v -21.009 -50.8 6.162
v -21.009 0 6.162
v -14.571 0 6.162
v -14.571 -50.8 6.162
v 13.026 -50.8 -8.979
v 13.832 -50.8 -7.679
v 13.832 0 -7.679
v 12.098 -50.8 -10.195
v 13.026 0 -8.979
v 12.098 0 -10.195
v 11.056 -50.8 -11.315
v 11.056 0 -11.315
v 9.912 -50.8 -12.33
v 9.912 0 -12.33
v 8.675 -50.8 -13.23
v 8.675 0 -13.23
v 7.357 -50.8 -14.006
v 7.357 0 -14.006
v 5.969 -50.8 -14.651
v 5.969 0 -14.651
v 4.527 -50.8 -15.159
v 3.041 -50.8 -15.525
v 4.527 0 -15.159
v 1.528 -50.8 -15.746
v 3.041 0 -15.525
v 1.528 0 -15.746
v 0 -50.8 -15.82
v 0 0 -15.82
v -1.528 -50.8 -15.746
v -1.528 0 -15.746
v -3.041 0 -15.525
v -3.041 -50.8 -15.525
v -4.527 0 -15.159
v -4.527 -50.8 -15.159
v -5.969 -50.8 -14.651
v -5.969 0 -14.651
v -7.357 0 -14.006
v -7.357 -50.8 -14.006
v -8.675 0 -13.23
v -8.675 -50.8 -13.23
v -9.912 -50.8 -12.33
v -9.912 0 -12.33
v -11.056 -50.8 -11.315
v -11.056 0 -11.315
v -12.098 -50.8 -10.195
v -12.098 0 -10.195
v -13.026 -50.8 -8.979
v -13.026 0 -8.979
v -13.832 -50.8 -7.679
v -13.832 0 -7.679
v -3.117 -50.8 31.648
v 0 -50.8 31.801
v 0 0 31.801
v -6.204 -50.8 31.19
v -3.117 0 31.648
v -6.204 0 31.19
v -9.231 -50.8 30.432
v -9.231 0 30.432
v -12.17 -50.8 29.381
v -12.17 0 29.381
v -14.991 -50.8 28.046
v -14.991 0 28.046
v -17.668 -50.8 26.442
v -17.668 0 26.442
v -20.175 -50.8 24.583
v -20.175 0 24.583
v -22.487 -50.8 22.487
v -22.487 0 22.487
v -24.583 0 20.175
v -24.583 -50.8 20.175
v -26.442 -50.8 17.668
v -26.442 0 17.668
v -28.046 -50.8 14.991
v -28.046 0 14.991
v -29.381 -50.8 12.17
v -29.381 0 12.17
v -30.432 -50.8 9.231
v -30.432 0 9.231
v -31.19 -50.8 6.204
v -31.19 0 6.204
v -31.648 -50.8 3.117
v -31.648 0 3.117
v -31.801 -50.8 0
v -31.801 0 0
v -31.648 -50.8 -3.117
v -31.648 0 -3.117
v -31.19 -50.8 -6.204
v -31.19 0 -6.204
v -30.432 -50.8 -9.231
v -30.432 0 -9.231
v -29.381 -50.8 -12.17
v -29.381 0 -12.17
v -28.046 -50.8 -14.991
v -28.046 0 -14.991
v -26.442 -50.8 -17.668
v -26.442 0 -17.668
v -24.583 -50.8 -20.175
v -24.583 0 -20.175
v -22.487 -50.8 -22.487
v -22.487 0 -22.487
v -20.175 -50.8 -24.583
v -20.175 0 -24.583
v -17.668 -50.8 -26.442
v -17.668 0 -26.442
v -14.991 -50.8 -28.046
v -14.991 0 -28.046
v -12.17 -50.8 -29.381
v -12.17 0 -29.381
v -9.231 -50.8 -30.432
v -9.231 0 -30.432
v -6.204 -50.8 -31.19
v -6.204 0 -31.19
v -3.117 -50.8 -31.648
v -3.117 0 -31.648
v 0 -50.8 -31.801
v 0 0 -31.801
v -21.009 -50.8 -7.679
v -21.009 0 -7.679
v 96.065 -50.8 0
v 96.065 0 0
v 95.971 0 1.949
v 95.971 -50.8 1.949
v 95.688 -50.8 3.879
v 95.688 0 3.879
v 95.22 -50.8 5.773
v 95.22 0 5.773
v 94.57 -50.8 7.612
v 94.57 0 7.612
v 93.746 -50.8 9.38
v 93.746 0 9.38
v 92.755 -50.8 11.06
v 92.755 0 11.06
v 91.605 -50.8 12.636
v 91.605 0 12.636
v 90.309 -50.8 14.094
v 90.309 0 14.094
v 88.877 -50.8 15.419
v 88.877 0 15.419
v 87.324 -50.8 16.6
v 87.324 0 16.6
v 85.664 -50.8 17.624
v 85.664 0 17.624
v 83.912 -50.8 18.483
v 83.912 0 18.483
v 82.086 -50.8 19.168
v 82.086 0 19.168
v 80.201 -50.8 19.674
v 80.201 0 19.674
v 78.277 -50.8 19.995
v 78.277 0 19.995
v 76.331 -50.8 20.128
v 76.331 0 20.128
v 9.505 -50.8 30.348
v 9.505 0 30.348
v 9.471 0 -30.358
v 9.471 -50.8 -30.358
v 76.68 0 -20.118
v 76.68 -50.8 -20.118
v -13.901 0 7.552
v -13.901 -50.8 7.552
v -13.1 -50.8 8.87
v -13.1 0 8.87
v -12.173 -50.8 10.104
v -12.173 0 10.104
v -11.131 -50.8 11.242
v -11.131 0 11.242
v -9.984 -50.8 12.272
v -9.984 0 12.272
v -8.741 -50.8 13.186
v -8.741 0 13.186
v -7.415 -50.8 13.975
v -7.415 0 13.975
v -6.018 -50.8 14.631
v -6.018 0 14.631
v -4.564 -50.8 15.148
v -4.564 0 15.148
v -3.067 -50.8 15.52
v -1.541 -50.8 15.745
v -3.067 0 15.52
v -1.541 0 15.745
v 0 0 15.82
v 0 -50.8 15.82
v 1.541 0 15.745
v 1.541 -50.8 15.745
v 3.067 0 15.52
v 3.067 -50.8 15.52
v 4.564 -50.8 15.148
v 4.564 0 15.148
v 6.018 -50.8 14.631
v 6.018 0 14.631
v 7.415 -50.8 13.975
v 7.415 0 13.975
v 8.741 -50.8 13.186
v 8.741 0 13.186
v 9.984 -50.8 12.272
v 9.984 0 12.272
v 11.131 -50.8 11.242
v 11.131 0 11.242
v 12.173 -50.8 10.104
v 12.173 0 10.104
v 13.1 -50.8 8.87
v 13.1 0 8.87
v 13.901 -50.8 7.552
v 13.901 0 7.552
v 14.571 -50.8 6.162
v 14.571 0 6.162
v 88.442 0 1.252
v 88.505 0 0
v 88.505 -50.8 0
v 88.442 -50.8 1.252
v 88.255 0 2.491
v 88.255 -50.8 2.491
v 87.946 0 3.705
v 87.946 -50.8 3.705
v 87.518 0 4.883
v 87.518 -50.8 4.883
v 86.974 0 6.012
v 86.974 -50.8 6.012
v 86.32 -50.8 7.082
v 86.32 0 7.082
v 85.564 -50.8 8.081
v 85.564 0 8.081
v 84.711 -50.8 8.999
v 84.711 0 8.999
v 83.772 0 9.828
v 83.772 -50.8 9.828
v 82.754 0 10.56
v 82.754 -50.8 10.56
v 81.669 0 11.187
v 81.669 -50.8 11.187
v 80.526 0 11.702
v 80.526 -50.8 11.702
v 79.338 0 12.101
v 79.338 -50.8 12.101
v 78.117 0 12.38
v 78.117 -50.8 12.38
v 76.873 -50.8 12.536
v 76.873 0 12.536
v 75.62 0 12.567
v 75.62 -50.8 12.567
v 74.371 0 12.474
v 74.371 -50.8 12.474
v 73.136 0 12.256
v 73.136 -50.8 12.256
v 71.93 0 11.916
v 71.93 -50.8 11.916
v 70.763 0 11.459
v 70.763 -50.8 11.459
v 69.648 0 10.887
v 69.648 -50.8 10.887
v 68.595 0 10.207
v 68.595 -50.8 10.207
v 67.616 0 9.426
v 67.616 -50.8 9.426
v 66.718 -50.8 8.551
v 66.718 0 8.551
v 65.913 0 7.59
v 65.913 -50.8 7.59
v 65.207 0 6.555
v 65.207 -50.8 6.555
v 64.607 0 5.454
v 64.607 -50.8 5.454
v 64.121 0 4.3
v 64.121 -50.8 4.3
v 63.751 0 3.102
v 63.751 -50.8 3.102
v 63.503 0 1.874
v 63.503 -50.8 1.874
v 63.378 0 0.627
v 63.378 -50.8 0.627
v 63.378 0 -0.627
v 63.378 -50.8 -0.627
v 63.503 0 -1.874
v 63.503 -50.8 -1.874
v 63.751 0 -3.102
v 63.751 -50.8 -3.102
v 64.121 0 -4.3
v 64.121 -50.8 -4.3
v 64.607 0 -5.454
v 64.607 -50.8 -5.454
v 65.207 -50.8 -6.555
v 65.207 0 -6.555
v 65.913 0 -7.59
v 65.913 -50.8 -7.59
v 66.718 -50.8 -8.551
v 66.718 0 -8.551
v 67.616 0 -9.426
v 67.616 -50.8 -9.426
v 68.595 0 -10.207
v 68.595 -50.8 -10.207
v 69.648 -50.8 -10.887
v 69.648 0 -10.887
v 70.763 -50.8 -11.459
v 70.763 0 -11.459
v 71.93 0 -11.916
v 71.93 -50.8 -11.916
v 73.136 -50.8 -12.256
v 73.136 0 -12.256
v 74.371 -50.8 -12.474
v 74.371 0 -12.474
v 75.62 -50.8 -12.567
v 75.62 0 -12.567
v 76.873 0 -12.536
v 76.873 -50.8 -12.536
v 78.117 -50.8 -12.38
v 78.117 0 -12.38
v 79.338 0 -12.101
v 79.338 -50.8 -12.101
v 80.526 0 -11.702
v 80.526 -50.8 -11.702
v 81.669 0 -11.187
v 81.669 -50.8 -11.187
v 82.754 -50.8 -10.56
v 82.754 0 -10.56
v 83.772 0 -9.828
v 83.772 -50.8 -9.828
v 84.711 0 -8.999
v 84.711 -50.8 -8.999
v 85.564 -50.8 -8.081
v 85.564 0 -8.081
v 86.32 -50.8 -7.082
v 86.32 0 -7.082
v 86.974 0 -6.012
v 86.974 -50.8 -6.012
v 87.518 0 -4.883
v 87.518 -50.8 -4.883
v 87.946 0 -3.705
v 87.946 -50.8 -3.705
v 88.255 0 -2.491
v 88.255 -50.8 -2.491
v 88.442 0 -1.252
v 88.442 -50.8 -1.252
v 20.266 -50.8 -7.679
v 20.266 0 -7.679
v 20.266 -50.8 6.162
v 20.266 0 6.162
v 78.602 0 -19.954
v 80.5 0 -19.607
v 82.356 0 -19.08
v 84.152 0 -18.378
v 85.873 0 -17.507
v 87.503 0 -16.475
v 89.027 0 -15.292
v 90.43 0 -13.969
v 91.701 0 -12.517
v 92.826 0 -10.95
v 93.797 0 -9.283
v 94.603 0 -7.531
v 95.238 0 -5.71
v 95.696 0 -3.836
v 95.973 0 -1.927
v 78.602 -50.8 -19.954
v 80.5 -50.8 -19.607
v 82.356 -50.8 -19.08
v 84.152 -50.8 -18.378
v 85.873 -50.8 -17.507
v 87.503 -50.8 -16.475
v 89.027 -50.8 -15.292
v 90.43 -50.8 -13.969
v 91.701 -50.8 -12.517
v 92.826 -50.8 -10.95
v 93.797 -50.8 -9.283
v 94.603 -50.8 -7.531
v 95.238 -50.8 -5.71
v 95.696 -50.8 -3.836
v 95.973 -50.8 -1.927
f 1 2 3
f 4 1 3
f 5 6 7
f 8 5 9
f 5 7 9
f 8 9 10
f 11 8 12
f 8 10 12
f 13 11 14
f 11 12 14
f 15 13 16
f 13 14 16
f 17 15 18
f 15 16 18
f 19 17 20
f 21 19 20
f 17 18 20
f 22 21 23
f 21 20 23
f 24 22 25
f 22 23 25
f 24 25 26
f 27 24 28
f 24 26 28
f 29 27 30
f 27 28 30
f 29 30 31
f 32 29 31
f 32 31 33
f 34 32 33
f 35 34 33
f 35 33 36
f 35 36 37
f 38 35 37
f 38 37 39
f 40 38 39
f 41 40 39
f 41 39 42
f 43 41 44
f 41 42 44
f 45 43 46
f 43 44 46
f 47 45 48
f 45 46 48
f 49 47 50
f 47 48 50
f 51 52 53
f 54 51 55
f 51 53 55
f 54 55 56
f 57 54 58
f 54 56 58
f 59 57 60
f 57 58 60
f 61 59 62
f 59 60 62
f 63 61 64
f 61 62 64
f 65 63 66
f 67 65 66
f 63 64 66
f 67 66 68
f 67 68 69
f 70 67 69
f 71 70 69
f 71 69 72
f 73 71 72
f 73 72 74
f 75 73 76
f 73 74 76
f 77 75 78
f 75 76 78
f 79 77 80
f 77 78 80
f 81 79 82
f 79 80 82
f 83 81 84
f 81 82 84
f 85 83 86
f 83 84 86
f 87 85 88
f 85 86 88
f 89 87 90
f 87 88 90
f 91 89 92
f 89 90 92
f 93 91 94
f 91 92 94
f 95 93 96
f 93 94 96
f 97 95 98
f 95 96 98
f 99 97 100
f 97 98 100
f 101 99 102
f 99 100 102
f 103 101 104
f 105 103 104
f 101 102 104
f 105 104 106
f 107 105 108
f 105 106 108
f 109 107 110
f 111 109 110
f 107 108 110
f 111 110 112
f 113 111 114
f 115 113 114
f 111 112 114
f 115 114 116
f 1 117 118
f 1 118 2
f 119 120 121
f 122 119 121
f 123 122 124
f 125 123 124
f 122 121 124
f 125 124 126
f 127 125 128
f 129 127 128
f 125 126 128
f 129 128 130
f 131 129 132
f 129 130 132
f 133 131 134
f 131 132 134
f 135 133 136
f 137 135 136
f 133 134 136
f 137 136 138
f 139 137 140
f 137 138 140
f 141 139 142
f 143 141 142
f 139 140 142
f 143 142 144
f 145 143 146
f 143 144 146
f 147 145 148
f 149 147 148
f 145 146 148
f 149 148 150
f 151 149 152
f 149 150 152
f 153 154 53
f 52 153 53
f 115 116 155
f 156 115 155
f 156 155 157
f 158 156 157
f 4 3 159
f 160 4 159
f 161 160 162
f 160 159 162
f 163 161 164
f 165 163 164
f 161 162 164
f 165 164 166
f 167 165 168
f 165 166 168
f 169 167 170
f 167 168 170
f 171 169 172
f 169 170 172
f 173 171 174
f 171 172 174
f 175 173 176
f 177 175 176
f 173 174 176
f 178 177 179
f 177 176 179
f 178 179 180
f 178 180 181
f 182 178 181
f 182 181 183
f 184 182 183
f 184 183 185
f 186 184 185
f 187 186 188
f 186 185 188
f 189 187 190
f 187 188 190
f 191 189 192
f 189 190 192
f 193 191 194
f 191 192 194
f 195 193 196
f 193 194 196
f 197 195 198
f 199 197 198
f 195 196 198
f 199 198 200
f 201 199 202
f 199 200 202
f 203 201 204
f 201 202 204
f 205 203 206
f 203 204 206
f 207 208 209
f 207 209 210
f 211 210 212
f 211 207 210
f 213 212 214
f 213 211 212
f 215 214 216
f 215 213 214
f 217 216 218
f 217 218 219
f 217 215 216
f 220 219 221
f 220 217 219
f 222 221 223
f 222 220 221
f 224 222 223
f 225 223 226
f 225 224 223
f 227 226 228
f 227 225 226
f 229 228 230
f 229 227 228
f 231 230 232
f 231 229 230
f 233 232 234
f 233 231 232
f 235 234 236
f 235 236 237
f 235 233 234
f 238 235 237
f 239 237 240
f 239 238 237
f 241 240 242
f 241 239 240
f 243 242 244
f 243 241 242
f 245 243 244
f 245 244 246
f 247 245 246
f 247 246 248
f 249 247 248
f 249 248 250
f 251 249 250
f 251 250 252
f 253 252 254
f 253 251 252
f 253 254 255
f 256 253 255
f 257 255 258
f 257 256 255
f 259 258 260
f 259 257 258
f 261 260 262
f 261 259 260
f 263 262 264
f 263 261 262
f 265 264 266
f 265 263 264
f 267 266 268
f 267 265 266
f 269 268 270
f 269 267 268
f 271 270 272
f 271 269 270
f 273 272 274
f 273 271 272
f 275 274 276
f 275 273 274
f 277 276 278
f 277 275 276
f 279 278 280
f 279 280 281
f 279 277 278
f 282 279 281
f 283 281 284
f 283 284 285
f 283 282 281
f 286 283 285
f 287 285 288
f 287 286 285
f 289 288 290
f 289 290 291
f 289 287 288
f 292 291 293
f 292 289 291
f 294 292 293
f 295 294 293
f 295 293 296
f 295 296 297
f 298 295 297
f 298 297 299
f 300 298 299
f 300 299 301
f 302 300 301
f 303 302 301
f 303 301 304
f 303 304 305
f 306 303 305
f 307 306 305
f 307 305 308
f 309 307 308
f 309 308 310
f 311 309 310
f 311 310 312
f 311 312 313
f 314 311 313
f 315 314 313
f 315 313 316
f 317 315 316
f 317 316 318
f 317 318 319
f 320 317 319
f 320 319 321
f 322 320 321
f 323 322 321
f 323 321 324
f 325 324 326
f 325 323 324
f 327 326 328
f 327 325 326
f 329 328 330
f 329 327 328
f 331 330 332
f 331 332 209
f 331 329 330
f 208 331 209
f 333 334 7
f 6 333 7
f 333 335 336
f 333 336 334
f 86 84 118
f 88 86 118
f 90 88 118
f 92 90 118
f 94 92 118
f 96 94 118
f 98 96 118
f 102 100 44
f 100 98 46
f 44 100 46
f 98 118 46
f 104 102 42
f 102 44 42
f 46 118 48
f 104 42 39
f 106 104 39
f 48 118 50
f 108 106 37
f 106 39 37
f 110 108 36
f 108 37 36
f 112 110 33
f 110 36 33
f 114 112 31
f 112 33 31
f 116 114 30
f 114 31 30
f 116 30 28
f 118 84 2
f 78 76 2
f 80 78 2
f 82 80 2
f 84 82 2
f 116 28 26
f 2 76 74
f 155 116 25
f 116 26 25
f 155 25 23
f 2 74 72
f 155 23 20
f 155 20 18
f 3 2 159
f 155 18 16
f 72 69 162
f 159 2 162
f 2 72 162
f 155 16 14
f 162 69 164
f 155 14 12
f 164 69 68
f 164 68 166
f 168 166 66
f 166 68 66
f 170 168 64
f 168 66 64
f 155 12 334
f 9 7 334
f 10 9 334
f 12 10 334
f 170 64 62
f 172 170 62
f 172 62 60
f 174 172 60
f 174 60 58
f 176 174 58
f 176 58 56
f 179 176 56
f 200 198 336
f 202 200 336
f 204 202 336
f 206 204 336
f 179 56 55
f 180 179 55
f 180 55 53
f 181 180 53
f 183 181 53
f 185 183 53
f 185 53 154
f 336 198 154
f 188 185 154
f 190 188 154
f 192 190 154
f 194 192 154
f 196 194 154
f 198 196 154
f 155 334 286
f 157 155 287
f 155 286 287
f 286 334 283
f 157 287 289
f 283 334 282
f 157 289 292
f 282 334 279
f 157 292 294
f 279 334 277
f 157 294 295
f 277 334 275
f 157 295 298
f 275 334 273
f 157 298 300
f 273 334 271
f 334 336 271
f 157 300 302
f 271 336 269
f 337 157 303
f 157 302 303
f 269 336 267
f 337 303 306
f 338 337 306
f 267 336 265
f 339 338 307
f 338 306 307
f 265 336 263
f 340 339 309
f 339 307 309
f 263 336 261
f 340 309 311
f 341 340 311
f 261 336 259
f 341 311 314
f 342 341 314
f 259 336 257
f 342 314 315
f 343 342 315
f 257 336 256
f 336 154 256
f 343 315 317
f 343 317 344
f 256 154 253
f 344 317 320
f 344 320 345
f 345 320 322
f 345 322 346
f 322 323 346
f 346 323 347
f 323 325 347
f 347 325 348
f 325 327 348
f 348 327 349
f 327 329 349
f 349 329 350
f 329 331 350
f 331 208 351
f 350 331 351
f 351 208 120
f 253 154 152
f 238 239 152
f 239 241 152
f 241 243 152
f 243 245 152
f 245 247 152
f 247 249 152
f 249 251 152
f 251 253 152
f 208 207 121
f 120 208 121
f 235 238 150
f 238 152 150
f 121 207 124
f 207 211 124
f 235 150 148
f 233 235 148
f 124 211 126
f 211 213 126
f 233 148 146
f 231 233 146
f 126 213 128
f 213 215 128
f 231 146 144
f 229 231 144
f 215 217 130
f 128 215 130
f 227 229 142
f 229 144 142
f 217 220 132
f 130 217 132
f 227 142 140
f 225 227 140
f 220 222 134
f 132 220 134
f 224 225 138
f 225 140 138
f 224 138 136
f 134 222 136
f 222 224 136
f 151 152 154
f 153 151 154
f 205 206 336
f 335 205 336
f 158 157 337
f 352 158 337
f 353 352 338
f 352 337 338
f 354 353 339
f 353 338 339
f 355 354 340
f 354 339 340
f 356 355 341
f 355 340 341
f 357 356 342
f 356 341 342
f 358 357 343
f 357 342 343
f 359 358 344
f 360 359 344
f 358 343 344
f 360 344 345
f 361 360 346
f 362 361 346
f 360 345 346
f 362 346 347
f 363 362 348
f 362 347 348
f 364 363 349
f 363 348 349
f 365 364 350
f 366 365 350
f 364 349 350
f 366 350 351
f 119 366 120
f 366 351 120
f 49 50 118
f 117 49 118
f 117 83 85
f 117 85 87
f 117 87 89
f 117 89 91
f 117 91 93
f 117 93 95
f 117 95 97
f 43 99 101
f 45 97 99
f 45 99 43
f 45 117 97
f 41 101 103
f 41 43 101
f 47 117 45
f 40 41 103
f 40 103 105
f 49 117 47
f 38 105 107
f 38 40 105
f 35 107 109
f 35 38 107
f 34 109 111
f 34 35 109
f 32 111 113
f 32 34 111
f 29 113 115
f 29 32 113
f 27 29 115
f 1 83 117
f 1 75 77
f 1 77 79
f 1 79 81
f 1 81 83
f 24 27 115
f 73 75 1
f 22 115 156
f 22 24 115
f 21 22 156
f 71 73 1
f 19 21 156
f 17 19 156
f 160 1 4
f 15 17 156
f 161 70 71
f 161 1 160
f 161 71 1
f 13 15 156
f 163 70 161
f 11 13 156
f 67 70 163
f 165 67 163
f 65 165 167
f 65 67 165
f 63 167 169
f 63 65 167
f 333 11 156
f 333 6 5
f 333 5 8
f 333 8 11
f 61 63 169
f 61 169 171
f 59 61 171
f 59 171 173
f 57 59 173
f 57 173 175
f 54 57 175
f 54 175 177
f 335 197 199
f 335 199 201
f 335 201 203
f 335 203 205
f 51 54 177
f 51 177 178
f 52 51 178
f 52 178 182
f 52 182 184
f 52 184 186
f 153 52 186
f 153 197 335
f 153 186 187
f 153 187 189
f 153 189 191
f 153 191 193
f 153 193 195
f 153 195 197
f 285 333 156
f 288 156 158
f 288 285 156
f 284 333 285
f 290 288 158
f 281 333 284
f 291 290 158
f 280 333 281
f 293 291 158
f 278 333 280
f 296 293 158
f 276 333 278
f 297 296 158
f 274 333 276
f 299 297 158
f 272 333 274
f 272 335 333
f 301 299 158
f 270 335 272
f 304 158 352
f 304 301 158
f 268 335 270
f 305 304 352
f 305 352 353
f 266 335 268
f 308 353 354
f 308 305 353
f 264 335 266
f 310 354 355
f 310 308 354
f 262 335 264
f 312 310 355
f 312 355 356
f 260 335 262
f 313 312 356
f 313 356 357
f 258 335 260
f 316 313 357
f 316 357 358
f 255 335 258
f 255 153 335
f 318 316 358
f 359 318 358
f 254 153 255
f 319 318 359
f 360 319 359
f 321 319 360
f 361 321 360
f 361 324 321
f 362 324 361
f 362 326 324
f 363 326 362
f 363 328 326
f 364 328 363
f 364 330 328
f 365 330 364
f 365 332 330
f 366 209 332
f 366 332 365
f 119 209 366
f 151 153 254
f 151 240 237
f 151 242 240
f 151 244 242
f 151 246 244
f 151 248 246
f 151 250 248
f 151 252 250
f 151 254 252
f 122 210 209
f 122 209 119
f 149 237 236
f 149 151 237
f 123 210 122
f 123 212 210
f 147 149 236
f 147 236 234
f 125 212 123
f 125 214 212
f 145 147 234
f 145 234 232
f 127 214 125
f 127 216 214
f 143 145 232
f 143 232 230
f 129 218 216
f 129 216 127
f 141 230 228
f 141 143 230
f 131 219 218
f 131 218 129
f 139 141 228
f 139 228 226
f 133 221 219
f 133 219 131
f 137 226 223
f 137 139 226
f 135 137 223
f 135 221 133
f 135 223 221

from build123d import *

# Parameters (mm, degrees)
F0_R     = 12.5710937777
F1_DEPTH = 50.8


with BuildPart() as f1:
    # F0 (on Front) → F1 (new body)
    with BuildSketch(Plane.XZ):
        with BuildLine():
            Line((9.5049608148, 30.3477681373), (0, 31.8014356752))
            ThreePointArc((0, 31.8014356752), (-31.8014356752, 0), (0, -31.8014356752))
            Line((0, -31.8014356752), (9.4712928792, -30.3582924783))
            ThreePointArc((9.4712928792, -30.3582924783), (25.6176894183, -18.8431764804), (31.8014356752, 0))
            ThreePointArc((31.8014356752, 0), (25.6281360125, 18.8289658646), (9.5049608148, 30.3477681373))
        make_face()
        with BuildLine():
            ThreePointArc((-14.5709457578, 6.1619072221), (0, 15.8202895325), (14.5709457578, 6.1619072221))
            Line((14.5709457578, 6.1619072221), (20.2656146139, 6.1619072221))
            Line((20.2656146139, 6.1619072221), (20.2656146139, -7.6786847785))
            Line((20.2656146139, -7.6786847785), (13.8318242095, -7.6786847785))
            ThreePointArc((13.8318242095, -7.6786847785), (0, -15.8202895325), (-13.8318242095, -7.6786847785))
            Line((-13.8318242095, -7.6786847785), (-21.0093853861, -7.6786847785))
            Line((-21.0093853861, -7.6786847785), (-21.0093853861, 6.1619072221))
            Line((-21.0093853861, 6.1619072221), (-14.5709457578, 6.1619072221))
        make_face(mode=Mode.SUBTRACT)
        with BuildLine():
            Line((76.3308829682, 20.1275604352), (9.5049608148, 30.3477681373))
            ThreePointArc((9.5049608148, 30.3477681373), (25.6281360125, 18.8289658646), (31.8014356752, 0))
            ThreePointArc((31.8014356752, 0), (25.6176894183, -18.8431764804), (9.4712928792, -30.3582924783))
            Line((9.4712928792, -30.3582924783), (76.6803919445, -20.1176257266))
            ThreePointArc((76.6803919445, -20.1176257266), (55.8029369519, -0.1748250718), (76.3308829682, 20.1275604352))
        make_face()
        with BuildLine():
            ThreePointArc((96.0651373404, 0), (90.3085177912, 14.0939657718), (76.3308829682, 20.1275604352))
            ThreePointArc((76.3308829682, 20.1275604352), (55.8029369519, -0.1748250718), (76.6803919445, -20.1176257266))
            ThreePointArc((76.6803919445, -20.1176257266), (90.4303700533, -13.9686006721), (96.0651373404, 0))
        make_face()
        with Locations((75.9336575866, 0)):
            Circle(F0_R, mode=Mode.SUBTRACT)
    extrude(amount=F1_DEPTH)


solid = f1.part
